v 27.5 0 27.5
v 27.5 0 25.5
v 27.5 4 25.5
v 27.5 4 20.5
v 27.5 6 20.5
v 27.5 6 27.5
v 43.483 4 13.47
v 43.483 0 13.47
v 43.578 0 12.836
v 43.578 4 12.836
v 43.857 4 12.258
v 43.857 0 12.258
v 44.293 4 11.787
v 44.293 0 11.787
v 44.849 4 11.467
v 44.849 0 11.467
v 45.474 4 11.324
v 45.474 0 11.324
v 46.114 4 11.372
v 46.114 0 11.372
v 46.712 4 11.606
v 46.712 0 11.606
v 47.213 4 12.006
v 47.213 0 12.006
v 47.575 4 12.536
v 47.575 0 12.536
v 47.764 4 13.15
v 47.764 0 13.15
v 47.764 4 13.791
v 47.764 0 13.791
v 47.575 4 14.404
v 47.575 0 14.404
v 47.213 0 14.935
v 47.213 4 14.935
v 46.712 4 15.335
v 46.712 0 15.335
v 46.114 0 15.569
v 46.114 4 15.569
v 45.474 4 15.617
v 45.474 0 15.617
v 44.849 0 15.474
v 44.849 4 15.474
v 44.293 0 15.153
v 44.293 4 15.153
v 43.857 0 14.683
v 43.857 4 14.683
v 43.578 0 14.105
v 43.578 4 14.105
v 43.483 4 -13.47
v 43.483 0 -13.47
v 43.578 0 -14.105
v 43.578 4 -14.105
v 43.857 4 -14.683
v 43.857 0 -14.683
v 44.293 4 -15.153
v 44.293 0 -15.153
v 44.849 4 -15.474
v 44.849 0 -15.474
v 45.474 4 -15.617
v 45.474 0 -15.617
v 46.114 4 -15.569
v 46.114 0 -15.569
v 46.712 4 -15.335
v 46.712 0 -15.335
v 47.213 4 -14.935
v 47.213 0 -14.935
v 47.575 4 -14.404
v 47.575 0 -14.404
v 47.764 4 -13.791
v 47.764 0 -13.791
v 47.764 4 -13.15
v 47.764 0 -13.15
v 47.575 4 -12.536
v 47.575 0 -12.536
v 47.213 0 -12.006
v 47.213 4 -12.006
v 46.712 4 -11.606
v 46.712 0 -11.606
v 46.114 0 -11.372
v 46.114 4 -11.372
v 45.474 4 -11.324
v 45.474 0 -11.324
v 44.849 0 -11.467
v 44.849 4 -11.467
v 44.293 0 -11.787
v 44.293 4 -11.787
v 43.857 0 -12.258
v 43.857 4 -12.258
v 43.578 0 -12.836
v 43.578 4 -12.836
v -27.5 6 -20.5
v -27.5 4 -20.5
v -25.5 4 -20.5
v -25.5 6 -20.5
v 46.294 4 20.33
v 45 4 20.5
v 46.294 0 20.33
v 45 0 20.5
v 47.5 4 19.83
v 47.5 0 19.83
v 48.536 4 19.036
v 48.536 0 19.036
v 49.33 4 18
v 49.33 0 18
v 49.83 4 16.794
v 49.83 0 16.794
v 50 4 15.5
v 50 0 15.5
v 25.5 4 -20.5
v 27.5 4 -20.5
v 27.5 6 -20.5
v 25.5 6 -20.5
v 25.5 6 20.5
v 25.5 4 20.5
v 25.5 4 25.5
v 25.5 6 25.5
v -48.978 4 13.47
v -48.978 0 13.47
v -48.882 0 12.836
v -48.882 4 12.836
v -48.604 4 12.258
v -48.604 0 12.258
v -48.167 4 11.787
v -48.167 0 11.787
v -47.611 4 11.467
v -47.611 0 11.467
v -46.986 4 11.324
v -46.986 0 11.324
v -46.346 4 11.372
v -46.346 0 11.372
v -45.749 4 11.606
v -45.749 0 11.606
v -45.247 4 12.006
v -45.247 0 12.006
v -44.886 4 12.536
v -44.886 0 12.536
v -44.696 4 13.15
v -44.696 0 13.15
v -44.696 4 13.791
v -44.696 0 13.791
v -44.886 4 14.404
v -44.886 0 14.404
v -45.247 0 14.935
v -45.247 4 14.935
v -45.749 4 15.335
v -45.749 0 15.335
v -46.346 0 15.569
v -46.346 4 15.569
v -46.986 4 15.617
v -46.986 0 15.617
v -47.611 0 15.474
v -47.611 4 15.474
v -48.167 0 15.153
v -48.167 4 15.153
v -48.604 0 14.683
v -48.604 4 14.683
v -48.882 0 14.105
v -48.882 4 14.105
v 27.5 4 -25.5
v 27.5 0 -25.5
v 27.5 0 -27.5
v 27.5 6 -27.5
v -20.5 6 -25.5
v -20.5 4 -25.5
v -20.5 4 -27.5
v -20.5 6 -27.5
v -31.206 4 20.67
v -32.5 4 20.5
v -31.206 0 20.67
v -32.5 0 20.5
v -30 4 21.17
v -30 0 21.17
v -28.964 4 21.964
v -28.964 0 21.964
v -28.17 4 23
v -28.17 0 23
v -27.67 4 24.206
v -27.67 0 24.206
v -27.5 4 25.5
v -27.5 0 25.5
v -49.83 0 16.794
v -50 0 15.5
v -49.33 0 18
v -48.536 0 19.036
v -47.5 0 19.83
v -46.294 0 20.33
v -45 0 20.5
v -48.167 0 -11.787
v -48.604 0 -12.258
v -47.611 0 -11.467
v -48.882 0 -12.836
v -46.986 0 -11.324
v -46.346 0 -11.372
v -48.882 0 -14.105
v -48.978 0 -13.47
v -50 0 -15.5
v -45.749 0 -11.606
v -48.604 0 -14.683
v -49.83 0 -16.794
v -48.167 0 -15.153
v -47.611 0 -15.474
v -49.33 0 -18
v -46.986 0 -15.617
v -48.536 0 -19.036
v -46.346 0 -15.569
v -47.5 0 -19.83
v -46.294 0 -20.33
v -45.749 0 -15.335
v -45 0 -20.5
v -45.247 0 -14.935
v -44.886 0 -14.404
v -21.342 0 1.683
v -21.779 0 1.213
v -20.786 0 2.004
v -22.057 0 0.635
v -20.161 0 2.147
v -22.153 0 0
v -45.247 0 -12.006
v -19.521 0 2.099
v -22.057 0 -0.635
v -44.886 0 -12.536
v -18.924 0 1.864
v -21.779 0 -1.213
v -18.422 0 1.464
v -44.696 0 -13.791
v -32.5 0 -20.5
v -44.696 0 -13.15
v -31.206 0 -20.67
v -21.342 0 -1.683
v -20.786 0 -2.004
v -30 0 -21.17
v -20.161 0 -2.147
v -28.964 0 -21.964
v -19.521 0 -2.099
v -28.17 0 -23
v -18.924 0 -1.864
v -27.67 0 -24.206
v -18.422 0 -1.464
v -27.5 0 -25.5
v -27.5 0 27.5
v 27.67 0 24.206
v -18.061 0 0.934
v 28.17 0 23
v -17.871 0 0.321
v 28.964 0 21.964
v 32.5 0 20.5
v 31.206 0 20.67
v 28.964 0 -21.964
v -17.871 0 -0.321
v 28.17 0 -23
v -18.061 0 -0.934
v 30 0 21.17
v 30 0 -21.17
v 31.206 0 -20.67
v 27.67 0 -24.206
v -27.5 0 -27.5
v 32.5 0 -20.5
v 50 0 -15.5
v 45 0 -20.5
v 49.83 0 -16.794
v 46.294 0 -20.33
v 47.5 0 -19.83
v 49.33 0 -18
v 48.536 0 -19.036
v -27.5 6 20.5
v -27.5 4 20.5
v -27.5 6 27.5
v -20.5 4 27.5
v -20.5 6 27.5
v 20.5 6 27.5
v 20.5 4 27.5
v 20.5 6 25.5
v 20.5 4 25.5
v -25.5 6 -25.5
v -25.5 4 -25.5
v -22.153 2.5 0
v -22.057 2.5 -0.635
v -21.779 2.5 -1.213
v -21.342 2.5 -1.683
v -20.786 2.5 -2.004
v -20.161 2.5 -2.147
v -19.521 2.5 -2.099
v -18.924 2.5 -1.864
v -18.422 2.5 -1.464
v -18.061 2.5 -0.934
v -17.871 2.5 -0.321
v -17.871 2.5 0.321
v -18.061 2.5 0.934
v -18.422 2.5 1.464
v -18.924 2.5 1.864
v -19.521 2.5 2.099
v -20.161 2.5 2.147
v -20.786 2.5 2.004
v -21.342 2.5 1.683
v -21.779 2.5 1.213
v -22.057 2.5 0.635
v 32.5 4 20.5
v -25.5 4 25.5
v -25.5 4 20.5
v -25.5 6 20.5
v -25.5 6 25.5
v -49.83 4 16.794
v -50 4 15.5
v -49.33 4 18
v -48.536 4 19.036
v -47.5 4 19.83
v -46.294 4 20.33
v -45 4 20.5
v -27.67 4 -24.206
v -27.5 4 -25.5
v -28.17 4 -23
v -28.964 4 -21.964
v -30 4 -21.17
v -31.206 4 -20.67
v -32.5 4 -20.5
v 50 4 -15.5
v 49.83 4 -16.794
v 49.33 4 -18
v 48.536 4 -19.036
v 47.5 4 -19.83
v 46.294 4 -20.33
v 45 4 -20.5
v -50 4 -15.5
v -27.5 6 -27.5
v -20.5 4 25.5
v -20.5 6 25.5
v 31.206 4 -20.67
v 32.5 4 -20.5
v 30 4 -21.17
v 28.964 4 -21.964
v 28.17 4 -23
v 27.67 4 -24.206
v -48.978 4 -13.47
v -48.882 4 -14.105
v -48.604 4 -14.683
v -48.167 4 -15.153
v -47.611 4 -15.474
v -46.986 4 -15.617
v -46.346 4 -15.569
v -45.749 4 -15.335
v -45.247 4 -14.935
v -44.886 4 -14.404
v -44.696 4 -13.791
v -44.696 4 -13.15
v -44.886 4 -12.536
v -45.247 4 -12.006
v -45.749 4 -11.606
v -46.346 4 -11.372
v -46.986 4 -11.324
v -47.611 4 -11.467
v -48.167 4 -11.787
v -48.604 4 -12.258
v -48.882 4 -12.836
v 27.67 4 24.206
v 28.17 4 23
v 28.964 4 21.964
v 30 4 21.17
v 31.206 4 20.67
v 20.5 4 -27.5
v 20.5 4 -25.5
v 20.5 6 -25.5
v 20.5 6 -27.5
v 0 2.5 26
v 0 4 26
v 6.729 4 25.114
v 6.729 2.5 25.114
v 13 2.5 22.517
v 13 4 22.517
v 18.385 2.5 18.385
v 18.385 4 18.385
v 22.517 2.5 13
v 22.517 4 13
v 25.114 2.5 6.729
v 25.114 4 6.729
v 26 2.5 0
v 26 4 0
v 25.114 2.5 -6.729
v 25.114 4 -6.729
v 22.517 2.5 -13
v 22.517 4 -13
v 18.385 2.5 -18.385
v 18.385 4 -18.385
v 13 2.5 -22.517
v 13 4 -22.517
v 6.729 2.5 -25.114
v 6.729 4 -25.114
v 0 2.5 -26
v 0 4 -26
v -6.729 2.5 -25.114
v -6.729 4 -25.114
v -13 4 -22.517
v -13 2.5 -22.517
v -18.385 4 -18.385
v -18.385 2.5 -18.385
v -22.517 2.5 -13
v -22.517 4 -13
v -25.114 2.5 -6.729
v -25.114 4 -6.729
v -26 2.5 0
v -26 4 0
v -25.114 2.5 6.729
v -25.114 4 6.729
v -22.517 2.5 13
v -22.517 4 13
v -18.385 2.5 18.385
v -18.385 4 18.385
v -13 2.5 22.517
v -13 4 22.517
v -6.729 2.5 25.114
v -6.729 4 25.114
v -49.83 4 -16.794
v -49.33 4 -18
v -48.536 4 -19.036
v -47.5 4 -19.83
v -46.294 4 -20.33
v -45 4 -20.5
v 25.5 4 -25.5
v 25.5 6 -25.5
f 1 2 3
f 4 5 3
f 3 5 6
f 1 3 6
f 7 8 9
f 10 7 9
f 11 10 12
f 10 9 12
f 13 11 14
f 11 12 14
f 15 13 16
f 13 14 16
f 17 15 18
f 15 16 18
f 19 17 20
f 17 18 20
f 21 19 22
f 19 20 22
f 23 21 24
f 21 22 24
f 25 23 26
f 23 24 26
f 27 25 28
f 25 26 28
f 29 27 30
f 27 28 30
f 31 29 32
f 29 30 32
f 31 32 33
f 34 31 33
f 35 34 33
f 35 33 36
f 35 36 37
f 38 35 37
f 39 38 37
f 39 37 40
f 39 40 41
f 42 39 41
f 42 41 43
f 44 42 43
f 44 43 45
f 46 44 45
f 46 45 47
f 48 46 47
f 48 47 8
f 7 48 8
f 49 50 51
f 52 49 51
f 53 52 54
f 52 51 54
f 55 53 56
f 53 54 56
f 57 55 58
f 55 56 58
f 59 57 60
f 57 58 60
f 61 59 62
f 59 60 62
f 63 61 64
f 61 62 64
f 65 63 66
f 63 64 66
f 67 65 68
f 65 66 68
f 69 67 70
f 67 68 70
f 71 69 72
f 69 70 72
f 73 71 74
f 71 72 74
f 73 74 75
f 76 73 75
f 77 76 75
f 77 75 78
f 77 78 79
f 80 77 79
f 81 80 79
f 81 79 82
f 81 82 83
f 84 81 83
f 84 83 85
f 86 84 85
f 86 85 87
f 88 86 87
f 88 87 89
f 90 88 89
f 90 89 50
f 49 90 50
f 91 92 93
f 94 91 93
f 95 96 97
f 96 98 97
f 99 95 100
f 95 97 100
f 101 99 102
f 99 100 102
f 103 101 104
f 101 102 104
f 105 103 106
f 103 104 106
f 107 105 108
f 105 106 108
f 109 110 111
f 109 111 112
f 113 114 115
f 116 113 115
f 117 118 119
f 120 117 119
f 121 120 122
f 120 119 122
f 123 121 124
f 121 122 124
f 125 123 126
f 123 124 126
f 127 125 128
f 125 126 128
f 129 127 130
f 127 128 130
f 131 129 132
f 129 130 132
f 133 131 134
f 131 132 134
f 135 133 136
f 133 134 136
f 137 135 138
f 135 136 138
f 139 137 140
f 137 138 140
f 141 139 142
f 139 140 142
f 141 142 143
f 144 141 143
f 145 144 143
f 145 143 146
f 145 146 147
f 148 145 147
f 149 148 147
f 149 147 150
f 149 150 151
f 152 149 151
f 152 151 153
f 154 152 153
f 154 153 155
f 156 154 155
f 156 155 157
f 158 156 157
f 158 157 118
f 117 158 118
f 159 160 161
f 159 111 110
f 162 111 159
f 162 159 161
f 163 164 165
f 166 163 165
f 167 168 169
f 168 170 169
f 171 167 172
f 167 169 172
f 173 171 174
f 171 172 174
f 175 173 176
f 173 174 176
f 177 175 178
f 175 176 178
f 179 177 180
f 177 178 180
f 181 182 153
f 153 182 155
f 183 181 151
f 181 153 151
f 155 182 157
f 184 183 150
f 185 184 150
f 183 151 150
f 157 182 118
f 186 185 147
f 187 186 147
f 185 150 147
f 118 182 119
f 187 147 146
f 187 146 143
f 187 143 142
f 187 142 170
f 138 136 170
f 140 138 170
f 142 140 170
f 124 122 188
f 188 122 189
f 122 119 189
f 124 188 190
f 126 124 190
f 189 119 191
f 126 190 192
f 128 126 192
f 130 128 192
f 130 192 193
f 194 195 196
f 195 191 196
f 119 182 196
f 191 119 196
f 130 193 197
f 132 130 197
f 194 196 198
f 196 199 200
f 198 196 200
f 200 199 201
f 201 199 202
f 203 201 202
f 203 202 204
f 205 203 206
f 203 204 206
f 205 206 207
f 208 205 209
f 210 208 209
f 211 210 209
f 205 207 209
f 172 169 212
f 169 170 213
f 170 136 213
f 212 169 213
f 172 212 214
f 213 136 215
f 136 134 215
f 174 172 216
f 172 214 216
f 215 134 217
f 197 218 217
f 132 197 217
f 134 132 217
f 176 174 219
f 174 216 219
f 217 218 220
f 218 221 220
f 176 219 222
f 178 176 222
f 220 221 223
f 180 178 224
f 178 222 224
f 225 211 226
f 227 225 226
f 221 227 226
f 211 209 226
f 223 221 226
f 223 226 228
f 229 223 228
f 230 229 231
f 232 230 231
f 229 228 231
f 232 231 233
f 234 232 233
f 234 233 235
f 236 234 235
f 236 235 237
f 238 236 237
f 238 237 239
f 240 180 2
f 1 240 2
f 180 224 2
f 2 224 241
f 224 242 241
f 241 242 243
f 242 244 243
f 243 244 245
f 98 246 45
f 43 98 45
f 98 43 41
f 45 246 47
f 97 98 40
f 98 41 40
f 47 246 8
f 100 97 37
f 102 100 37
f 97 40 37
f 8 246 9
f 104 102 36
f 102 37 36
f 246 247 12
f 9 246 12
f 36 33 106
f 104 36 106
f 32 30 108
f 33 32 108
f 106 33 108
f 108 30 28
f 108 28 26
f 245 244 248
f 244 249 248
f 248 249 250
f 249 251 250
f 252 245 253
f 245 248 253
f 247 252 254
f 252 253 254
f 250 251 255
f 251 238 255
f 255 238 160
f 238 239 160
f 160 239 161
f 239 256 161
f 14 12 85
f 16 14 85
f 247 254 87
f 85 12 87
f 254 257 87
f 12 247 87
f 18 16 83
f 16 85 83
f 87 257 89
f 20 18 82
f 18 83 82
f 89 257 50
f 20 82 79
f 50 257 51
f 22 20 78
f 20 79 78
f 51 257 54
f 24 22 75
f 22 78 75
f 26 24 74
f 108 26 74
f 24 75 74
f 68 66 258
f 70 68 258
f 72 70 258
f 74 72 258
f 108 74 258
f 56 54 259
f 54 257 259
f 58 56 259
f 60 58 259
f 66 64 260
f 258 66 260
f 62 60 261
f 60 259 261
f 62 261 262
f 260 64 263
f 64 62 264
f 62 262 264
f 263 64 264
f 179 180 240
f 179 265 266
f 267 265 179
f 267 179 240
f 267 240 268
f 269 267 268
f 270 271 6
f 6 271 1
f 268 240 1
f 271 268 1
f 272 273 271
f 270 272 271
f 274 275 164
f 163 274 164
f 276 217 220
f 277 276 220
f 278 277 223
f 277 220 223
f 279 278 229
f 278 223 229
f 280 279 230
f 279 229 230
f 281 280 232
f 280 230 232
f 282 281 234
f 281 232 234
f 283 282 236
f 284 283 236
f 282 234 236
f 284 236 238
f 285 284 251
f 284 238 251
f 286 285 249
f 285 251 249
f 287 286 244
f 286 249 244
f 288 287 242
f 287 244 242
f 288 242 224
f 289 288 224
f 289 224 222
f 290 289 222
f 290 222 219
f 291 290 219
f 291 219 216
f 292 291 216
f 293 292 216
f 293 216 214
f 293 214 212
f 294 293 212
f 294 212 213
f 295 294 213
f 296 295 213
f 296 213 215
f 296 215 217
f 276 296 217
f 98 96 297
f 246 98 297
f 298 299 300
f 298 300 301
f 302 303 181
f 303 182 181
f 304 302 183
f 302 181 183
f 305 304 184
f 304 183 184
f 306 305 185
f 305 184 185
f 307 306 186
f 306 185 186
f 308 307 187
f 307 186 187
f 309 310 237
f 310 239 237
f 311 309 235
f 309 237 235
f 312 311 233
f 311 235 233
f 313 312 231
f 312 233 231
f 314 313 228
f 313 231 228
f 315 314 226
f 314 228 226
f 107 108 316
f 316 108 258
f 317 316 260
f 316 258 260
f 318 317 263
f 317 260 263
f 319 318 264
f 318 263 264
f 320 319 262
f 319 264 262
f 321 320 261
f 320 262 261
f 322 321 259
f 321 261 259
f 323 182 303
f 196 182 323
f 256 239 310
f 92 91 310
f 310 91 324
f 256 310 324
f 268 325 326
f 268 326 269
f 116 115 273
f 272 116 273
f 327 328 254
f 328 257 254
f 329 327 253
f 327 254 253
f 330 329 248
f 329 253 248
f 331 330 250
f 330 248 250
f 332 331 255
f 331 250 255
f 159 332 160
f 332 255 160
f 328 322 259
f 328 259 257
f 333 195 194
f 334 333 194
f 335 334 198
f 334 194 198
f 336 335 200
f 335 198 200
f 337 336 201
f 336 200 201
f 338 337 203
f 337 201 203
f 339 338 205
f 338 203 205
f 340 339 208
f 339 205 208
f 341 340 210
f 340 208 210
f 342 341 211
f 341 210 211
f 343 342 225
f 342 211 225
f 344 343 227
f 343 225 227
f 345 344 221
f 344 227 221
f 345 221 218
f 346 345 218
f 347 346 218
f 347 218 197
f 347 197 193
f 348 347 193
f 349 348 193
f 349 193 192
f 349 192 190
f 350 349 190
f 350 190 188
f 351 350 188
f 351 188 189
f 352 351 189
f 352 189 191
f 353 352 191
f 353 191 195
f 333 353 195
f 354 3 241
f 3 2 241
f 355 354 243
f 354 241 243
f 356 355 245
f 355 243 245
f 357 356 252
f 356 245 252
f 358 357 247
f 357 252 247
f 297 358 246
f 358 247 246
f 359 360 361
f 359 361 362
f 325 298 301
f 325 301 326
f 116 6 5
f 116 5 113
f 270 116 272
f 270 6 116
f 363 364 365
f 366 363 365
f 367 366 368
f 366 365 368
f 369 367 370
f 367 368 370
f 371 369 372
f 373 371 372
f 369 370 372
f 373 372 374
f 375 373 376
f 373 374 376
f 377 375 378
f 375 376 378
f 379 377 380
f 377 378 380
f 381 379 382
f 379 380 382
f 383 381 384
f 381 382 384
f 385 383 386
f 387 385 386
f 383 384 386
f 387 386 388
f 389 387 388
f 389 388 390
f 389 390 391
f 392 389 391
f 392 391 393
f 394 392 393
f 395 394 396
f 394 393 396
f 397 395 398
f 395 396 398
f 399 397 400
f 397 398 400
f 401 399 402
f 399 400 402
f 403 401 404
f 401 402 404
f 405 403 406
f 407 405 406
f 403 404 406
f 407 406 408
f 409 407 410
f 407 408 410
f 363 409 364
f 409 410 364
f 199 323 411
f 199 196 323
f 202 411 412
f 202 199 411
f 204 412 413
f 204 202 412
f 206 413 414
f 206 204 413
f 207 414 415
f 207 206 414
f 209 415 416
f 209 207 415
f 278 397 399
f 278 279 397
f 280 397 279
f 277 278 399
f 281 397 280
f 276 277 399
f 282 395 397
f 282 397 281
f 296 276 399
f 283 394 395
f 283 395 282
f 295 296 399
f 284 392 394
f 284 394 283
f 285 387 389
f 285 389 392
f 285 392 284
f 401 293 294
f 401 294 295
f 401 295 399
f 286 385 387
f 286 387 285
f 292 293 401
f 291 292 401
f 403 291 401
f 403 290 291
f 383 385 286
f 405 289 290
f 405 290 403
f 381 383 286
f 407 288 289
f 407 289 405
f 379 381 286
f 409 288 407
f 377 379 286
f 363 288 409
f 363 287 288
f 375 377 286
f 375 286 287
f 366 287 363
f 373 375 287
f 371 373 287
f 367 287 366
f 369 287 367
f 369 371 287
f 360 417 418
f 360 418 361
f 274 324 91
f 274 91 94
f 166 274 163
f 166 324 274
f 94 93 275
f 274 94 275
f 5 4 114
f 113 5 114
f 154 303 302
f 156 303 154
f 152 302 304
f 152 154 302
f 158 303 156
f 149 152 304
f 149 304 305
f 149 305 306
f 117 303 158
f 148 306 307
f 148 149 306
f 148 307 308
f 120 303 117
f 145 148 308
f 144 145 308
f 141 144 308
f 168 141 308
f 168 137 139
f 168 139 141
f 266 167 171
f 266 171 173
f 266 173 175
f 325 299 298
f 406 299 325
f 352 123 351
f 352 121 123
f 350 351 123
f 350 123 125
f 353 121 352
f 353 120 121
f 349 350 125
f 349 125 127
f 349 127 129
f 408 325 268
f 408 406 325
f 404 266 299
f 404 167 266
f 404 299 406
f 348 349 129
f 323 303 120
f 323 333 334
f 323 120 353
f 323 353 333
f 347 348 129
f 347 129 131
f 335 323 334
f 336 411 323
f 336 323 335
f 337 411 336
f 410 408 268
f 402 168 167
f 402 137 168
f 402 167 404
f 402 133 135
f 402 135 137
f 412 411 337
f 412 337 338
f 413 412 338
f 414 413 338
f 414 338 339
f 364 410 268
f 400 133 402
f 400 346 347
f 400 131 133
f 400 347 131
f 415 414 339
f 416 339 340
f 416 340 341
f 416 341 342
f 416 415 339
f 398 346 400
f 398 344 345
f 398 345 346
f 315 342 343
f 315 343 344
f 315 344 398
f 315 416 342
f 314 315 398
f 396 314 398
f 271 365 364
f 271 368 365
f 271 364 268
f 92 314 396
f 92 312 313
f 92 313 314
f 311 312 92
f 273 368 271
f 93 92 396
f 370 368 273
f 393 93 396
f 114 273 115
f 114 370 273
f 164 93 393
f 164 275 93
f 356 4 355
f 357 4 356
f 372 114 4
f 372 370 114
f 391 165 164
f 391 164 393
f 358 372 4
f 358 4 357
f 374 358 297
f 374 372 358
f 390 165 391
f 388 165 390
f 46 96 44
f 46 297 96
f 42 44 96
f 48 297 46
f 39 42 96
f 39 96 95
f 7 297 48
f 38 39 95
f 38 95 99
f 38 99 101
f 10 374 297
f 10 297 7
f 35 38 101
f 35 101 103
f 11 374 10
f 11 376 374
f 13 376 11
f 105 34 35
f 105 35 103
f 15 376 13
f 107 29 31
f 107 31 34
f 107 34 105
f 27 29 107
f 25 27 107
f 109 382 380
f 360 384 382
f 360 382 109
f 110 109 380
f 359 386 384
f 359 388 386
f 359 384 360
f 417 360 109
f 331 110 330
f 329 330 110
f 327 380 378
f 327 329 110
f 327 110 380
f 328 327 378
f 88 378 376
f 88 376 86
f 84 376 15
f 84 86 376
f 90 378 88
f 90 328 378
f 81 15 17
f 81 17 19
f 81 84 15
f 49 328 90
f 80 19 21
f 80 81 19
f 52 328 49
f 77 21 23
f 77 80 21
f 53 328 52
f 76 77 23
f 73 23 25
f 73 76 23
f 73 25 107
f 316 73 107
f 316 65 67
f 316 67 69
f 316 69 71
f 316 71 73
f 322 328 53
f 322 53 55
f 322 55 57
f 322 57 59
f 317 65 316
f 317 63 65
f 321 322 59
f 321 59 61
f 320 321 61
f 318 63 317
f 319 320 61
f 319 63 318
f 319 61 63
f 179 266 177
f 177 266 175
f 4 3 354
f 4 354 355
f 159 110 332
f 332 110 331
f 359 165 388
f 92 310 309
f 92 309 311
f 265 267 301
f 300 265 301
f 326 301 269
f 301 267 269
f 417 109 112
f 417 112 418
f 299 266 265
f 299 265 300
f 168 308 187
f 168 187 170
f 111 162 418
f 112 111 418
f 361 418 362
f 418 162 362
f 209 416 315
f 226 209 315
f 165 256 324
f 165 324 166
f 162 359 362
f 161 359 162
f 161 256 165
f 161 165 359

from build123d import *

# Parameters (mm, degrees)
SKETCH1_W               = 100
SKETCH1_H               = 55
BOSS_EXTRUDE1_DEPTH     = 4
F_6_CLEARANCE_HOLE1_D   = 4.3053
SKETCH4_R               = 26
CUT_EXTRUDE1_DEPTH      = 1.5
BOSS_EXTRUDE2_DEPTH     = 2
CUT_EXTRUDE2_REACH      = 59.204
SKETCH7_W               = 22.5
SKETCH7_H               = 7
MIRROR2_COPY_1_DEPTH    = 2
MIRROR2_COPY_2_REACH    = 59.204
MIRROR2_COPY_2_SKETCH_W = 22.5
MIRROR2_COPY_2_SKETCH_H = 7
FILLET1_R               = 5


with BuildPart() as part:
    # Sketch1 → Boss-Extrude1 (new body)
    with BuildSketch(Plane(origin=(0, 0, 0), x_dir=(1, 0, 0), z_dir=(0, 1, 0))):
        Rectangle(SKETCH1_W, SKETCH1_H)
    extrude(amount=BOSS_EXTRUDE1_DEPTH)

    # #6 Clearance Hole1 (through all)
    with Locations(Plane(origin=(0, 4, 0), x_dir=(1, 0, 0), z_dir=(0, 1, 0))):
        with Locations((45.6352, 13.470384182), (45.6352, -13.470384182), (-46.825, -13.470384182), (-46.825, 13.470384182), (-20, 0)):
            Hole(F_6_CLEARANCE_HOLE1_D / 2)

    # Sketch4 → Cut-Extrude1 (cut)
    with BuildSketch(Plane(origin=(0, 4, 0), x_dir=(1, 0, 0), z_dir=(0, 1, 0))):
        with Locations(Location((0, 0, 0), (0, 0, 270))):
            Circle(SKETCH4_R)
    extrude(amount=-CUT_EXTRUDE1_DEPTH, mode=Mode.SUBTRACT)

    # Sketch6 → Boss-Extrude2 (add)
    with BuildSketch(Plane(origin=(0, 4, 0), x_dir=(1, 0, 0), z_dir=(0, 1, 0))):
        Polygon((-20.5, 25.5), (-20.5, 27.5), (-27.5, 27.5), (-27.5, 20.5), (-25.5, 20.5), (-25.5, 25.5), align=None)
    boss_extrude2 = extrude(amount=BOSS_EXTRUDE2_DEPTH)

    # Sketch7 → Cut-Extrude2 (cut, up to next)
    with BuildSketch(Plane(origin=(0, 4, 0), x_dir=(1, 0, 0), z_dir=(0, 1, 0)), mode=Mode.PRIVATE) as cut_extrude2_sk1:
        with Locations((-38.75, 24)):
            Rectangle(SKETCH7_W, SKETCH7_H)
    cut_extrude2_tool1 = extrude(cut_extrude2_sk1.sketch, amount=-CUT_EXTRUDE2_REACH, mode=Mode.PRIVATE) & part.part
    cut_extrude2 = cut_extrude2_tool1.solids().sort_by_distance((-38.75, 4, -24))[0]
    add(cut_extrude2, mode=Mode.SUBTRACT)

    # Mirror1: Boss-Extrude2, Cut-Extrude2 across plane
    add(boss_extrude2.mirror(Plane.XY))
    add(cut_extrude2.mirror(Plane.XY), mode=Mode.SUBTRACT)

    # Mirror2: Boss-Extrude2, Cut-Extrude2 across plane
    add(boss_extrude2.mirror(Plane(origin=(0, 0, 0), x_dir=(0, 0, 1), z_dir=(1, 0, 0))))
    add(cut_extrude2.mirror(Plane(origin=(0, 0, 0), x_dir=(0, 0, 1), z_dir=(1, 0, 0))), mode=Mode.SUBTRACT)

    # Mirror2 copy 1 sketch → Mirror2 copy 1 (add)
    with BuildSketch(Plane(origin=(0, 4, 0), x_dir=(-1, 0, 0), z_dir=(0, 1, 0))):
        Polygon((-20.5, 25.5), (-20.5, 27.5), (-27.5, 27.5), (-27.5, 20.5), (-25.5, 20.5), (-25.5, 25.5), align=None)
    extrude(amount=MIRROR2_COPY_1_DEPTH)

    # Mirror2 copy 2 sketch → Mirror2 copy 2 (cut, up to next)
    with BuildSketch(Plane(origin=(0, 4, 0), x_dir=(-1, 0, 0), z_dir=(0, 1, 0)), mode=Mode.PRIVATE) as mirror2_copy_2_sk1:
        with Locations((-38.75, 24)):
            Rectangle(MIRROR2_COPY_2_SKETCH_W, MIRROR2_COPY_2_SKETCH_H)
    mirror2_copy_2_tool1 = extrude(mirror2_copy_2_sk1.sketch, amount=-MIRROR2_COPY_2_REACH, mode=Mode.PRIVATE) & part.part
    add(mirror2_copy_2_tool1.solids().sort_by_distance((38.75, 4, 24))[0], mode=Mode.SUBTRACT)

    # Fillet1
    fillet1_edges = [part.edges().sort_by_distance(p)[0] for p in [
        (-50, 2, 20.5),
        (-27.5, 2, 20.5),
        (50, 2, 20.5),
        (27.5, 2, 20.5),
        (50, 2, -20.5),
        (27.5, 2, -20.5),
        (-50, 2, -20.5),
        (-27.5, 2, -20.5),
    ]]
    fillet(fillet1_edges, radius=FILLET1_R)


solid = part.part
